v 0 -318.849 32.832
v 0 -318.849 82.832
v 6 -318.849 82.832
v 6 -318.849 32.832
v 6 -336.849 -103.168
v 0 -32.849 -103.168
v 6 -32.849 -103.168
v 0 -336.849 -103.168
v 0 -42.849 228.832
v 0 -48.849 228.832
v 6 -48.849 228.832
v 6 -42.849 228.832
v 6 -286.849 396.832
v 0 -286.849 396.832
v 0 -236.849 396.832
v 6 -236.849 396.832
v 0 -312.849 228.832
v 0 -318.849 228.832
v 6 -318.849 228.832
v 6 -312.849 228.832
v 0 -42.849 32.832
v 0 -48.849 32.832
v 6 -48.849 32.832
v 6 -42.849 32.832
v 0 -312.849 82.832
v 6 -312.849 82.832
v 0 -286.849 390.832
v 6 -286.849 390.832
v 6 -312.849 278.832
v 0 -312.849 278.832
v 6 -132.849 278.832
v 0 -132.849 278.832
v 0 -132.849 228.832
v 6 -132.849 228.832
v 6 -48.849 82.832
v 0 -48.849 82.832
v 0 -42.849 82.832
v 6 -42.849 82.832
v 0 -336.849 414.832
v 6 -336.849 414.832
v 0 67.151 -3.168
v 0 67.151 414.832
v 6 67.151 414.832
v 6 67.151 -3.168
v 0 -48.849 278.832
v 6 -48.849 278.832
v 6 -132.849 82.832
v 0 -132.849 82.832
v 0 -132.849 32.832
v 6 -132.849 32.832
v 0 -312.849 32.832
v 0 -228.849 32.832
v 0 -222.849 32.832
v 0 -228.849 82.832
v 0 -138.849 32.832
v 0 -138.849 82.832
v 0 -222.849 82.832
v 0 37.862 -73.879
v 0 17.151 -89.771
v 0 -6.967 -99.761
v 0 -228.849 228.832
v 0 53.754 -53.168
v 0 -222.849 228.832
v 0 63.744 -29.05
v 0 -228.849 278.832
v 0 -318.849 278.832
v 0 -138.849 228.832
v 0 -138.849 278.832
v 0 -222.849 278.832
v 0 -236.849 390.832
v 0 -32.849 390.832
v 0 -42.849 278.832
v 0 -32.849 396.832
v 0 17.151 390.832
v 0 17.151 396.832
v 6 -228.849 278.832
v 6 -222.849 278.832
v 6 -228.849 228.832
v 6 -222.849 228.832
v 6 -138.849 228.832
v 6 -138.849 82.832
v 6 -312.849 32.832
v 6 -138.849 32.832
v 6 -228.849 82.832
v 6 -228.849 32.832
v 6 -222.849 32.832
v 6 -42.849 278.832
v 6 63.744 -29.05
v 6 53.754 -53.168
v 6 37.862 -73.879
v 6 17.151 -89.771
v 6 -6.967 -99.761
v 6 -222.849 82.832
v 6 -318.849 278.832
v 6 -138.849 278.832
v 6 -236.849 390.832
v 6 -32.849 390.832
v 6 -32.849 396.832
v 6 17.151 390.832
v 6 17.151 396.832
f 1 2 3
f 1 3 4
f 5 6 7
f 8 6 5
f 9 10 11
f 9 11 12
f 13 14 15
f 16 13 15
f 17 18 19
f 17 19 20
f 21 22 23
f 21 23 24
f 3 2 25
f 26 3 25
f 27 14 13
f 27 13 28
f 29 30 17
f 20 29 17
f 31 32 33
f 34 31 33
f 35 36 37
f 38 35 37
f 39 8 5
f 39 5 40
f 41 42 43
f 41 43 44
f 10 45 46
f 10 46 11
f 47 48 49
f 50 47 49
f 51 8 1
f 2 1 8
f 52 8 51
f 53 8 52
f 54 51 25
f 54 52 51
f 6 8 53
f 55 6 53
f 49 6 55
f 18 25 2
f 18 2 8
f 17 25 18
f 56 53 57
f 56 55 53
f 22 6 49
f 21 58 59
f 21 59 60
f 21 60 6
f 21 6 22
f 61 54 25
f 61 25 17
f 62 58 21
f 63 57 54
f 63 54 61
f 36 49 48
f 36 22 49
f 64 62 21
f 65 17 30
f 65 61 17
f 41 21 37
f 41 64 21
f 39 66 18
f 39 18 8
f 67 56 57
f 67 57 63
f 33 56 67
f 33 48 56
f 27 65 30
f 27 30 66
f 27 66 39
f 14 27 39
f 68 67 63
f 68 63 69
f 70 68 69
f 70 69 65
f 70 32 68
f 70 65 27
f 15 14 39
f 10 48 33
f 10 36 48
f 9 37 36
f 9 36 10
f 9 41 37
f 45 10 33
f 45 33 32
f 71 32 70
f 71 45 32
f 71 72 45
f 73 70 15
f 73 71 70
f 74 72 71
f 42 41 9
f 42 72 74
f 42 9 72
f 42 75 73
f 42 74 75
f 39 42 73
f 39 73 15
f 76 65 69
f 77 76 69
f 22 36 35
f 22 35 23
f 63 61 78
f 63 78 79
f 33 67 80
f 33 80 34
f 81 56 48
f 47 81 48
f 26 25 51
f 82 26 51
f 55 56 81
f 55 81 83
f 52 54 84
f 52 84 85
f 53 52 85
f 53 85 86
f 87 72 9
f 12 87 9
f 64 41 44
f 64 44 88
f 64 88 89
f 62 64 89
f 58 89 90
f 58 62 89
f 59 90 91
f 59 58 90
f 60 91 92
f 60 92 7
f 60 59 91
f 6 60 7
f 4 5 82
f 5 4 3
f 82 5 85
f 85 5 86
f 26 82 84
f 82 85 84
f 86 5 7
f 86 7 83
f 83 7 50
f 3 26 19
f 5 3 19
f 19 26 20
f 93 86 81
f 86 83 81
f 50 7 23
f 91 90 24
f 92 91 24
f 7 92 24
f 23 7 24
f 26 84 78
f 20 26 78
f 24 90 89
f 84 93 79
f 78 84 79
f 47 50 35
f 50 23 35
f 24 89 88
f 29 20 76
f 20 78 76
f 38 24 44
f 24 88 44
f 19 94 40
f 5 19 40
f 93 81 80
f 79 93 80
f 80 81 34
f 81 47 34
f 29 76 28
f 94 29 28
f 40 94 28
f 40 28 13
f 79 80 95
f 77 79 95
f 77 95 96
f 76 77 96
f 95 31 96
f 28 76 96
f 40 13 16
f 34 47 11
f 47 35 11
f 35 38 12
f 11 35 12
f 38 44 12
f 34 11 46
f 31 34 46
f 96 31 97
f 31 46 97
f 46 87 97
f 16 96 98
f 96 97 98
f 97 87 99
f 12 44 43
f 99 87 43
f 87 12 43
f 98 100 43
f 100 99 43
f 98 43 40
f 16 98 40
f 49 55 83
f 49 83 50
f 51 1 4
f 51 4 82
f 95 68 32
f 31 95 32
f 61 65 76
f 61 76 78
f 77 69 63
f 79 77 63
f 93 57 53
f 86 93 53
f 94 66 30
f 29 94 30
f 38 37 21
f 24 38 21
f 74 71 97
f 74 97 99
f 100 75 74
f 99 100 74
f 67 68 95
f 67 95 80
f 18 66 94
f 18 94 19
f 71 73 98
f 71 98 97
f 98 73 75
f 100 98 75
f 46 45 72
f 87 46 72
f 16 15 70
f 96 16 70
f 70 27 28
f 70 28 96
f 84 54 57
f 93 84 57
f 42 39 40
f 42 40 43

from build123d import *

# Parameters (mm, degrees)
SKETCH1_W           = 6
SKETCH1_H           = 50
SKETCH1_W_2         = 50
SKETCH1_H_2         = 6
BOSS_EXTRUDE1_DEPTH = 6


with BuildPart() as part:
    # Sketch1 → Boss-Extrude1 (new body)
    with BuildSketch(Plane(origin=(0, 0, 0), x_dir=(0, 0, -1), z_dir=(1, 0, 0))):
        with BuildLine():
            Line((-414.831767264, 67.151199882), (3.168232736, 67.151199882))
            ThreePointArc((3.168232736, 67.151199882), (73.878910855, 37.861878001), (103.168232736, -32.848800118))
            Line((103.168232736, -32.848800118), (103.168232736, -336.848800118))
            Line((103.168232736, -336.848800118), (-414.831767264, -336.848800118))
            Line((-414.831767264, -336.848800118), (-414.831767264, 67.151199882))
        make_face()
        with Locations((-393.831767264, -7.848800118)):
            Rectangle(SKETCH1_W, SKETCH1_H, mode=Mode.SUBTRACT)
        with Locations((-393.831767264, -261.848800118)):
            Rectangle(SKETCH1_W, SKETCH1_H, mode=Mode.SUBTRACT)
        with Locations((-253.831767264, -315.848800118)):
            Rectangle(SKETCH1_W_2, SKETCH1_H_2, mode=Mode.SUBTRACT)
        with Locations((-57.831767264, -315.848800118)):
            Rectangle(SKETCH1_W_2, SKETCH1_H_2, mode=Mode.SUBTRACT)
        with Locations((-253.831767264, -225.848800118)):
            Rectangle(SKETCH1_W_2, SKETCH1_H_2, mode=Mode.SUBTRACT)
        with Locations((-57.831767264, -225.848800118)):
            Rectangle(SKETCH1_W_2, SKETCH1_H_2, mode=Mode.SUBTRACT)
        with Locations((-253.831767264, -135.848800118)):
            Rectangle(SKETCH1_W_2, SKETCH1_H_2, mode=Mode.SUBTRACT)
        with Locations((-57.831767264, -135.848800118)):
            Rectangle(SKETCH1_W_2, SKETCH1_H_2, mode=Mode.SUBTRACT)
        with Locations((-253.831767264, -45.848800118)):
            Rectangle(SKETCH1_W_2, SKETCH1_H_2, mode=Mode.SUBTRACT)
        with Locations((-57.831767264, -45.848800118)):
            Rectangle(SKETCH1_W_2, SKETCH1_H_2, mode=Mode.SUBTRACT)
    extrude(amount=BOSS_EXTRUDE1_DEPTH)


solid = part.part
